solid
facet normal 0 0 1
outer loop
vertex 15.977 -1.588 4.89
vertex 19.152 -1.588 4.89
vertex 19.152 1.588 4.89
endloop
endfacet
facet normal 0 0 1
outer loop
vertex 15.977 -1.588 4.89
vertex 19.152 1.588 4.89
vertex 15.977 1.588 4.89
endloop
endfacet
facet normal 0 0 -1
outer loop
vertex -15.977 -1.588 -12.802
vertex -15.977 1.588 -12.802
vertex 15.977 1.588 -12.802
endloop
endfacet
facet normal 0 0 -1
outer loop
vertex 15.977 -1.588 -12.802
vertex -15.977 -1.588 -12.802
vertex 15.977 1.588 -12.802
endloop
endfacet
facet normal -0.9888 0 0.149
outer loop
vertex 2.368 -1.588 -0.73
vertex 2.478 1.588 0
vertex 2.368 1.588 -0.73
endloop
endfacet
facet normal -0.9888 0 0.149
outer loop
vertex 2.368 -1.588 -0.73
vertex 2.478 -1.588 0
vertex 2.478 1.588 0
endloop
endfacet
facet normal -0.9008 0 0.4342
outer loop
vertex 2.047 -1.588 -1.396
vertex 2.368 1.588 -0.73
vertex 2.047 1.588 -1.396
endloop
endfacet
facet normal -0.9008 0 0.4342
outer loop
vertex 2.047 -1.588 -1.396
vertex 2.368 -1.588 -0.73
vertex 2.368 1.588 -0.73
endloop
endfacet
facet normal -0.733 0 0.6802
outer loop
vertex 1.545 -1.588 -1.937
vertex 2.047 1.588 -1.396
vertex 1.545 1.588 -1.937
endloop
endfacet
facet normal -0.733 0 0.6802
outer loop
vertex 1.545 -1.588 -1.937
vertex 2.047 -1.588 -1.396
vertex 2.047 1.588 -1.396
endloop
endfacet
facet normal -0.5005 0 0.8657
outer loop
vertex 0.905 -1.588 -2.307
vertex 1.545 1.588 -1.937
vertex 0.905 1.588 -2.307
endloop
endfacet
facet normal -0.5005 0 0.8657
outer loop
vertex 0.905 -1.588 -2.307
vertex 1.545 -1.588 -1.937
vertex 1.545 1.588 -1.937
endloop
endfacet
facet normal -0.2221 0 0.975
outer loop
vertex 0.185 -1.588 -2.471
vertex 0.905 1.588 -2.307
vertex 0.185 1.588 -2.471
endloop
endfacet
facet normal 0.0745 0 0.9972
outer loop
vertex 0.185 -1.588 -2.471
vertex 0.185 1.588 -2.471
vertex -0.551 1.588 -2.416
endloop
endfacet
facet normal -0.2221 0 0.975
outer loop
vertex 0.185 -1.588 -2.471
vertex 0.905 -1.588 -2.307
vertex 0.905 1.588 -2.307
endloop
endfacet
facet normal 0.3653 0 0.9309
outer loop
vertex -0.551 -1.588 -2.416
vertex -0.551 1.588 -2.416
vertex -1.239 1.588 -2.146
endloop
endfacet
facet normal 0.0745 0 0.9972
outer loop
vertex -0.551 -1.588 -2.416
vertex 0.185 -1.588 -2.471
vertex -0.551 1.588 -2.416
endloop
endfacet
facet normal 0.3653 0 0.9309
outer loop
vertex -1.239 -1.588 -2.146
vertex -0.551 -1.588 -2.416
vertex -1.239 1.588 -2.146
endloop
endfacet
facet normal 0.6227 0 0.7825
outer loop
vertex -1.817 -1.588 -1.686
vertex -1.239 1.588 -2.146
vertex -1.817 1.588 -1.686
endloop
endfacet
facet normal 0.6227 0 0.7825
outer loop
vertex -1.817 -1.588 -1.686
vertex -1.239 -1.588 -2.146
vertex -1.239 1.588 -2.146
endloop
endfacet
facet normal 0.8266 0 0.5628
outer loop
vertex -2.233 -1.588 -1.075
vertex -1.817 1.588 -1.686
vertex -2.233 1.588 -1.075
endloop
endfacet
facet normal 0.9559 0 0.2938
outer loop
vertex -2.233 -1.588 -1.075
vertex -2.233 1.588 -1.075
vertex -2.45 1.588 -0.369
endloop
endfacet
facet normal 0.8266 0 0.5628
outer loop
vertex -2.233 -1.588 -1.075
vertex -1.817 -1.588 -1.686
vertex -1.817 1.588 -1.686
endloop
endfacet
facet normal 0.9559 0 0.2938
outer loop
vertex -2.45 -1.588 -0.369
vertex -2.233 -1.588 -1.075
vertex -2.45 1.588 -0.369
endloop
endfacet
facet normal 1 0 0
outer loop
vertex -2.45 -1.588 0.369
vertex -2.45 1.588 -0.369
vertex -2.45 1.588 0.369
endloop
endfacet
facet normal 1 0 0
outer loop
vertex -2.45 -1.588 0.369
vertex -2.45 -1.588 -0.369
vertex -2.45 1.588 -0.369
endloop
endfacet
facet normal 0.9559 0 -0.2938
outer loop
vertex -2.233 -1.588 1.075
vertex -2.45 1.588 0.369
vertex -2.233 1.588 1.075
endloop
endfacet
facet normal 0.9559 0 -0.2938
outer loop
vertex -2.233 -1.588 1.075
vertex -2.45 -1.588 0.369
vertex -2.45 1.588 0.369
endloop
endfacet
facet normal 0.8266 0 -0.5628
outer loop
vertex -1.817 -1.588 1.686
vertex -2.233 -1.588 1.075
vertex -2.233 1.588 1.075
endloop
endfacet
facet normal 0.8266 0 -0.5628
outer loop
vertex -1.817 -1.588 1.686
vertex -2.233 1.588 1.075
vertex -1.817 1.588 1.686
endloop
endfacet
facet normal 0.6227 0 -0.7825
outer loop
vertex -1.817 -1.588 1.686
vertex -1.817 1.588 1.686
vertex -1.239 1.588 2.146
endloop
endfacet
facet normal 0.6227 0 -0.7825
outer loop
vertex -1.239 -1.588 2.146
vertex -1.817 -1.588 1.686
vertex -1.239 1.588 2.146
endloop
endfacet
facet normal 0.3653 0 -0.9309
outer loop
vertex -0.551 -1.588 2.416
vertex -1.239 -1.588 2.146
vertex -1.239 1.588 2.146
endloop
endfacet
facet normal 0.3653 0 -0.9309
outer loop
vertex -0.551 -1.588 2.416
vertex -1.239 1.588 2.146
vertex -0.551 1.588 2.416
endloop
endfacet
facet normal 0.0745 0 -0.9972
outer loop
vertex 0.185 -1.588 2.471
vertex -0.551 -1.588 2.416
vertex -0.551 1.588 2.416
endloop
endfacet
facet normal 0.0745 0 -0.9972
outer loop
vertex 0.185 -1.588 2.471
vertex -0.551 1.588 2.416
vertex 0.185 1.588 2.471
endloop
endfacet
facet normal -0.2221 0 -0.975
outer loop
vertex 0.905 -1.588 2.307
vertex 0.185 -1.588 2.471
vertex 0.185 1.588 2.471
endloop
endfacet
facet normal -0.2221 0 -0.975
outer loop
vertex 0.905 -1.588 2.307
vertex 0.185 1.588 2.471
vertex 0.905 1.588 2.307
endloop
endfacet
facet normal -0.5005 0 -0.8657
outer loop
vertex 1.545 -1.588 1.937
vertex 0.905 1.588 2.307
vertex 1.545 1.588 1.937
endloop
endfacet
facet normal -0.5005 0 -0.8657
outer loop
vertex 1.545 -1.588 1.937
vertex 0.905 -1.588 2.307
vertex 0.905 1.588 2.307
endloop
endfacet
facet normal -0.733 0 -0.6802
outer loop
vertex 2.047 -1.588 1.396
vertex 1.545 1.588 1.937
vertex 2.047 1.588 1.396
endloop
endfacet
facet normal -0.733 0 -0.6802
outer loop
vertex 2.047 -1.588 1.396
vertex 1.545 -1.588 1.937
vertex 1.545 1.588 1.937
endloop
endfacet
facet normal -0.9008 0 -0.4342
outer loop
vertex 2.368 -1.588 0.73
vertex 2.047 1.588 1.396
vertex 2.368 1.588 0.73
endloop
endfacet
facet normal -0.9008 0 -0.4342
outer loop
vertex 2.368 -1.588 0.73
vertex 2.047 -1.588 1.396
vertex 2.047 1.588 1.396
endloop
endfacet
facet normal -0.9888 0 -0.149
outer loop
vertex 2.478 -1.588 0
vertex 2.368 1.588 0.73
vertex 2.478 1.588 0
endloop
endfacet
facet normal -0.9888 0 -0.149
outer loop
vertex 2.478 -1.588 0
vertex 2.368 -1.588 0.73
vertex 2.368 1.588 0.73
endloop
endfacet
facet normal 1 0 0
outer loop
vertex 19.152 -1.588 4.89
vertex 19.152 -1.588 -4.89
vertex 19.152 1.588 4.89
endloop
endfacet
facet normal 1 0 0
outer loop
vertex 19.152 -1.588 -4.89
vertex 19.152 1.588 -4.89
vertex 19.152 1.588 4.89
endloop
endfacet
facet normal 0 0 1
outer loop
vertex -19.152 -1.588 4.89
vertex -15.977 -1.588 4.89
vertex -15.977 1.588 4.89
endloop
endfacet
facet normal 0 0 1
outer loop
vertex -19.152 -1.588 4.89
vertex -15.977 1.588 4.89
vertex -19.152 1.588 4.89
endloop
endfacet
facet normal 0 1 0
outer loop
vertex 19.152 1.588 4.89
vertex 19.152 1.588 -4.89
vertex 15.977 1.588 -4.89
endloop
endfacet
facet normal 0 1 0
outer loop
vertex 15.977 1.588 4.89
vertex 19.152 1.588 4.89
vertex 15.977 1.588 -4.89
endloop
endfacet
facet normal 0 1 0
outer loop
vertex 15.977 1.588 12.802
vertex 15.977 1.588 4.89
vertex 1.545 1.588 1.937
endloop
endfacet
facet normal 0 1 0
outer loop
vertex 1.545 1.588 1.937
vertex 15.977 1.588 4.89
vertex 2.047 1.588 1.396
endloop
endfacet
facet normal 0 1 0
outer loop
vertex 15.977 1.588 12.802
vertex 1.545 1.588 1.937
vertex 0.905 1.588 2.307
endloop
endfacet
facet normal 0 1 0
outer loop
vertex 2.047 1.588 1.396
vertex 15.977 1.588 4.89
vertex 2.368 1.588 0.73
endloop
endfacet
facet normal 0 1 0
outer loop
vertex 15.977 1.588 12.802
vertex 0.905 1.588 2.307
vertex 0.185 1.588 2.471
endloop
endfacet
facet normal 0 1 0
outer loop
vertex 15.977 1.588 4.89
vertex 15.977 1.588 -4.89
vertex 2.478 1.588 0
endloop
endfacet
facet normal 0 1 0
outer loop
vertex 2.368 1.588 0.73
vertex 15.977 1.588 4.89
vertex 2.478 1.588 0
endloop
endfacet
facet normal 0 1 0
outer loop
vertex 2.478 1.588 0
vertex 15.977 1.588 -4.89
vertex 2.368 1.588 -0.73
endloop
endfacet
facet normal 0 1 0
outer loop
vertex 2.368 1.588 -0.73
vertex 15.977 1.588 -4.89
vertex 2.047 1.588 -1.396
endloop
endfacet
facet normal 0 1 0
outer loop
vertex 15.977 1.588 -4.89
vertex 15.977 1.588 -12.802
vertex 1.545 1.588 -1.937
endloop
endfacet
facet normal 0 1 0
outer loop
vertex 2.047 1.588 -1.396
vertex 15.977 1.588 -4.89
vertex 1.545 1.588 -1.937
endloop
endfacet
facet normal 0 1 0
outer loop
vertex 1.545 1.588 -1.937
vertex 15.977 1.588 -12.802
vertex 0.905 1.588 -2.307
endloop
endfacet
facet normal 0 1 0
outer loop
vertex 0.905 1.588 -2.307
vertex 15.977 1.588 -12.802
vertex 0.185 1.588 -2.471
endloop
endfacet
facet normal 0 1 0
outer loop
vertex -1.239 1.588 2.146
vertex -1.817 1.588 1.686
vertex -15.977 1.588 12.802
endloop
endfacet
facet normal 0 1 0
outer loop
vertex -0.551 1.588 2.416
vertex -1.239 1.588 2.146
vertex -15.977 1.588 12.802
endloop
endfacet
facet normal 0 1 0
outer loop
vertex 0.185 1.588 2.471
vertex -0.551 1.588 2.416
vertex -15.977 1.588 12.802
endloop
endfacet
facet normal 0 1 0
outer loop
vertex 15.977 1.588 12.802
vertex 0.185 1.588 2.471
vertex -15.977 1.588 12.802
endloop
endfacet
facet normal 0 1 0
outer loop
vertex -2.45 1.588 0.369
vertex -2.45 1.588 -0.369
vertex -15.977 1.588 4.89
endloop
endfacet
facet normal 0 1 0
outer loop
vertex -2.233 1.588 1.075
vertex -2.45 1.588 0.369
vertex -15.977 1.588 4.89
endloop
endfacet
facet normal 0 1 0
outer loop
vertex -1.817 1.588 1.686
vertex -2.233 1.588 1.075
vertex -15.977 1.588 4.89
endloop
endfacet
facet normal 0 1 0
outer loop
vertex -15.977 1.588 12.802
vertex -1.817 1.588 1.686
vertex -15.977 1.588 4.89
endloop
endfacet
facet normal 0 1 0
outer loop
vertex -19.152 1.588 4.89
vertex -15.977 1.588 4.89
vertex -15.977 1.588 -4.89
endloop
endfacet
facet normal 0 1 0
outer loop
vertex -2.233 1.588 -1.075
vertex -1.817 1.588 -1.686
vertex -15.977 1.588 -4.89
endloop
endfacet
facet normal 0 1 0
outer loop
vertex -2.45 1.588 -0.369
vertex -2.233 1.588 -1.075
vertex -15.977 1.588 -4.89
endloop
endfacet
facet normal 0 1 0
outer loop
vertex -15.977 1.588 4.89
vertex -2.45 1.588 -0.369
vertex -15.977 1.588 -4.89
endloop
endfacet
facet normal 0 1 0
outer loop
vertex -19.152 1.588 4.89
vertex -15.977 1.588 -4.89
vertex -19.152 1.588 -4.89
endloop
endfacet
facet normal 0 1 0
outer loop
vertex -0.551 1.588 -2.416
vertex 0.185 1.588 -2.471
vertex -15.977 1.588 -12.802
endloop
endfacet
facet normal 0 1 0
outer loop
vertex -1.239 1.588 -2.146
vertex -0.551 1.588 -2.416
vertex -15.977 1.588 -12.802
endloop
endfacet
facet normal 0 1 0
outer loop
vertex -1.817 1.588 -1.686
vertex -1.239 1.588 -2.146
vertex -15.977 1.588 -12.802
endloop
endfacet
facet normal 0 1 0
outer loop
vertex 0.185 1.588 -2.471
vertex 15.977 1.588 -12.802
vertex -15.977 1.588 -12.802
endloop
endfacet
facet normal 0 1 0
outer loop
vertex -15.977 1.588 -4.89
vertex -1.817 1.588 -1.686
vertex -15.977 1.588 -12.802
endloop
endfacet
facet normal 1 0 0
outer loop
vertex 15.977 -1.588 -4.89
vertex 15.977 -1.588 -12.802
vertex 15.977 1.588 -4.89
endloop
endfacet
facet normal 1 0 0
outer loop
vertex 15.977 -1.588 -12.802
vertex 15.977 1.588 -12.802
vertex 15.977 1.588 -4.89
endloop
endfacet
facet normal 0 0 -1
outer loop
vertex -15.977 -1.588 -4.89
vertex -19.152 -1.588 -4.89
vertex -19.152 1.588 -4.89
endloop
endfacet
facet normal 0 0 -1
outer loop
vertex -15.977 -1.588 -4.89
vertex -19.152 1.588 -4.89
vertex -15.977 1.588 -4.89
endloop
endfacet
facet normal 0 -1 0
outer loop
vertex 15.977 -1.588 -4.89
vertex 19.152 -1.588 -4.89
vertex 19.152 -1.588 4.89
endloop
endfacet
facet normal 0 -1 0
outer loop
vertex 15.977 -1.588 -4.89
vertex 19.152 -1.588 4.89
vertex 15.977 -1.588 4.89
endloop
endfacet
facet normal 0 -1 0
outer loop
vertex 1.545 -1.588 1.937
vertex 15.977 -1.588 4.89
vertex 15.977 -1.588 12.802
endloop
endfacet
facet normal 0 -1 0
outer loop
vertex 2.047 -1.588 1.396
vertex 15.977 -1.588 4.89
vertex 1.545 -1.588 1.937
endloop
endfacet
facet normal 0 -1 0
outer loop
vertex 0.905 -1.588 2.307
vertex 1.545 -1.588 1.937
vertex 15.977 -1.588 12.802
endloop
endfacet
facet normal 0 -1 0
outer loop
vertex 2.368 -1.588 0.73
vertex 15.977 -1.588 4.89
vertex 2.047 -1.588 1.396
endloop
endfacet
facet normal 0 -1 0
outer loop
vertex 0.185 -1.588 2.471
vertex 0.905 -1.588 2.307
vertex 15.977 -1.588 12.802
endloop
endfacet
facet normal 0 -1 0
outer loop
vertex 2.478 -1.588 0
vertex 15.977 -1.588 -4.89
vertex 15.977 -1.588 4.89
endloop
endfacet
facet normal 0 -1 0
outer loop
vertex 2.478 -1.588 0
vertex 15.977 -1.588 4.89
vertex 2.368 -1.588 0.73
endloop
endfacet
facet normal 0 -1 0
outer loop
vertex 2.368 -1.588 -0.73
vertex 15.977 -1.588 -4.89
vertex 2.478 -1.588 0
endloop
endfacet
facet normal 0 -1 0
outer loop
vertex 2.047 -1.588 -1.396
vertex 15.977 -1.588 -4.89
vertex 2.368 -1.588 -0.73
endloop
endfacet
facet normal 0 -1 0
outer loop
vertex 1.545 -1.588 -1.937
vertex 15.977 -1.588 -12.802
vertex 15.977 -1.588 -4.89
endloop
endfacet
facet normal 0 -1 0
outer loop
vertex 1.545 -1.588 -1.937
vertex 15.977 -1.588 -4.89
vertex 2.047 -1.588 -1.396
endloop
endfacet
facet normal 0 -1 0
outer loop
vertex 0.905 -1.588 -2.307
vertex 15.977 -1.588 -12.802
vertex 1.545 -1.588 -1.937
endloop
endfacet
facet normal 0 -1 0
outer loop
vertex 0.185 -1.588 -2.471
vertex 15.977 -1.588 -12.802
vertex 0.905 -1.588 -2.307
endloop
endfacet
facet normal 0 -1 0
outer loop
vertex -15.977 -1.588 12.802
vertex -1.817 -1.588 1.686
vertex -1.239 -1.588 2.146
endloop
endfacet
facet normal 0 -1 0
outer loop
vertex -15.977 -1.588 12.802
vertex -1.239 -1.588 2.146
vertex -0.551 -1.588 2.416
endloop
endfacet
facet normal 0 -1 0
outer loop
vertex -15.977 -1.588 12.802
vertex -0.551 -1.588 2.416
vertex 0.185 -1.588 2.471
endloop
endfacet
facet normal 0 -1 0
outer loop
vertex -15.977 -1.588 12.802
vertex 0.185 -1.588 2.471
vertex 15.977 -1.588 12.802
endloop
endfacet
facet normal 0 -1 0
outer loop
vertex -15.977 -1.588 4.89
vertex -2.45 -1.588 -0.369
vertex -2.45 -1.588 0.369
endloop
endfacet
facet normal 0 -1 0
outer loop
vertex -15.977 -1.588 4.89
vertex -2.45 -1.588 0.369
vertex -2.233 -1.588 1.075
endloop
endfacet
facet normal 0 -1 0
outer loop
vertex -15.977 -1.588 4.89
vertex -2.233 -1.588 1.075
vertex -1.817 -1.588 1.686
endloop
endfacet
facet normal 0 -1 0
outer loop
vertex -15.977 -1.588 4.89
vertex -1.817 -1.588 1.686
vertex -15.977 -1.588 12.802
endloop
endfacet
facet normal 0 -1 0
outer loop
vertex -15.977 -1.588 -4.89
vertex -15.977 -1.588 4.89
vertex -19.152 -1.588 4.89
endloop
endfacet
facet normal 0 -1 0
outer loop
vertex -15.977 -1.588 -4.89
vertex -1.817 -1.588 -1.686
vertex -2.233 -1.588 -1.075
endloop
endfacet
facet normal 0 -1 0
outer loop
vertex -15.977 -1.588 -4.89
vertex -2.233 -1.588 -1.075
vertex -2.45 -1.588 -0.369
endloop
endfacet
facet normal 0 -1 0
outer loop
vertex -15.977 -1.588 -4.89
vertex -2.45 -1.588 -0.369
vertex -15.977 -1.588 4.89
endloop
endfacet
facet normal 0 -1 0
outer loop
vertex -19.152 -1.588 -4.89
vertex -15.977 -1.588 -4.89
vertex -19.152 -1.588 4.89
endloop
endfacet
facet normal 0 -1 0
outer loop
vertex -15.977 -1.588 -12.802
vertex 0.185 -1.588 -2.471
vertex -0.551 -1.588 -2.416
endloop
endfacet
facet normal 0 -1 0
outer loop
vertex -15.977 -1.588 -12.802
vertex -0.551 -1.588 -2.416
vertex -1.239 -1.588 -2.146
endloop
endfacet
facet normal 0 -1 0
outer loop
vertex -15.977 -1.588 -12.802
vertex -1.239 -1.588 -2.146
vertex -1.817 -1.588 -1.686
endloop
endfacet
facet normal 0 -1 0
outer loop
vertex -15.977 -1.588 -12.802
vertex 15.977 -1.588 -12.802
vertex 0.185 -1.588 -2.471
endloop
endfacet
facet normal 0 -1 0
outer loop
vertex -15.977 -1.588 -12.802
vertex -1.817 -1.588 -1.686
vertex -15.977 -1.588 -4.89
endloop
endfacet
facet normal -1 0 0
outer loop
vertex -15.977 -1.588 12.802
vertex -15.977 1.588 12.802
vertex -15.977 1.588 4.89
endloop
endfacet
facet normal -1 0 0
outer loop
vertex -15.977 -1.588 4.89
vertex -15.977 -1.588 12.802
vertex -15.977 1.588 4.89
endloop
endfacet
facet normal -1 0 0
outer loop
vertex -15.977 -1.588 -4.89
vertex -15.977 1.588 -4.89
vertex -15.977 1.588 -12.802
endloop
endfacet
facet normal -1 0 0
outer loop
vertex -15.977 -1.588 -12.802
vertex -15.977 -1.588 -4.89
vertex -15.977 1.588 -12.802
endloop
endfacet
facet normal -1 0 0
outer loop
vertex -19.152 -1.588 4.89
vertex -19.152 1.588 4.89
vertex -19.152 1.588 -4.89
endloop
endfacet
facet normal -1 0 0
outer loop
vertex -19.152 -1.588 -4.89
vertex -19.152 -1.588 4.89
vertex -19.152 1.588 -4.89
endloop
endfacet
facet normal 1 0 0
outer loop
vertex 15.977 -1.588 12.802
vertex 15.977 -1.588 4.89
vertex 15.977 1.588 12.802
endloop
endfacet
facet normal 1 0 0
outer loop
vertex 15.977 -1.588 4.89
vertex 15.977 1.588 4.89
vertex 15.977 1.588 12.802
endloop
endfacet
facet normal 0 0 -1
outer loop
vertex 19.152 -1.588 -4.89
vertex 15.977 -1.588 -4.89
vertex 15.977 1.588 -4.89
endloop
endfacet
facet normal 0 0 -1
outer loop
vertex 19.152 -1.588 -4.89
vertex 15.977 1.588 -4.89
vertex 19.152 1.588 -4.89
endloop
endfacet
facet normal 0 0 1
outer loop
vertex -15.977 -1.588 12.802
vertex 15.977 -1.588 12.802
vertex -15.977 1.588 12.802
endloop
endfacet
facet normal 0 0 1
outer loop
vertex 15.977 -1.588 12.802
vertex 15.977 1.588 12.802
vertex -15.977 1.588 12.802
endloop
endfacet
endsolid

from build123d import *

# Parameters (mm, degrees)
SKETCH1_R           = 2.4780875
BOSS_EXTRUDE1_DEPTH = 1.5875


with BuildPart() as part:
    # Sketch1 → Boss-Extrude1 (new body, symmetric)
    with BuildSketch(Plane(origin=(0, 0, 0), x_dir=(1, 0, 0), z_dir=(0, 1, 0))):
        Polygon((-15.9766, 12.8016), (15.9766, 12.8016), (15.9766, 4.8895), (19.1516, 4.8895), (19.1516, -4.8895), (15.9766, -4.8895), (15.9766, -12.8016), (-15.9766, -12.8016), (-15.9766, -4.8895), (-19.1516, -4.8895), (-19.1516, 4.8895), (-15.9766, 4.8895), align=None)
        Circle(SKETCH1_R, mode=Mode.SUBTRACT)
    extrude(amount=BOSS_EXTRUDE1_DEPTH, both=True)


solid = part.part
